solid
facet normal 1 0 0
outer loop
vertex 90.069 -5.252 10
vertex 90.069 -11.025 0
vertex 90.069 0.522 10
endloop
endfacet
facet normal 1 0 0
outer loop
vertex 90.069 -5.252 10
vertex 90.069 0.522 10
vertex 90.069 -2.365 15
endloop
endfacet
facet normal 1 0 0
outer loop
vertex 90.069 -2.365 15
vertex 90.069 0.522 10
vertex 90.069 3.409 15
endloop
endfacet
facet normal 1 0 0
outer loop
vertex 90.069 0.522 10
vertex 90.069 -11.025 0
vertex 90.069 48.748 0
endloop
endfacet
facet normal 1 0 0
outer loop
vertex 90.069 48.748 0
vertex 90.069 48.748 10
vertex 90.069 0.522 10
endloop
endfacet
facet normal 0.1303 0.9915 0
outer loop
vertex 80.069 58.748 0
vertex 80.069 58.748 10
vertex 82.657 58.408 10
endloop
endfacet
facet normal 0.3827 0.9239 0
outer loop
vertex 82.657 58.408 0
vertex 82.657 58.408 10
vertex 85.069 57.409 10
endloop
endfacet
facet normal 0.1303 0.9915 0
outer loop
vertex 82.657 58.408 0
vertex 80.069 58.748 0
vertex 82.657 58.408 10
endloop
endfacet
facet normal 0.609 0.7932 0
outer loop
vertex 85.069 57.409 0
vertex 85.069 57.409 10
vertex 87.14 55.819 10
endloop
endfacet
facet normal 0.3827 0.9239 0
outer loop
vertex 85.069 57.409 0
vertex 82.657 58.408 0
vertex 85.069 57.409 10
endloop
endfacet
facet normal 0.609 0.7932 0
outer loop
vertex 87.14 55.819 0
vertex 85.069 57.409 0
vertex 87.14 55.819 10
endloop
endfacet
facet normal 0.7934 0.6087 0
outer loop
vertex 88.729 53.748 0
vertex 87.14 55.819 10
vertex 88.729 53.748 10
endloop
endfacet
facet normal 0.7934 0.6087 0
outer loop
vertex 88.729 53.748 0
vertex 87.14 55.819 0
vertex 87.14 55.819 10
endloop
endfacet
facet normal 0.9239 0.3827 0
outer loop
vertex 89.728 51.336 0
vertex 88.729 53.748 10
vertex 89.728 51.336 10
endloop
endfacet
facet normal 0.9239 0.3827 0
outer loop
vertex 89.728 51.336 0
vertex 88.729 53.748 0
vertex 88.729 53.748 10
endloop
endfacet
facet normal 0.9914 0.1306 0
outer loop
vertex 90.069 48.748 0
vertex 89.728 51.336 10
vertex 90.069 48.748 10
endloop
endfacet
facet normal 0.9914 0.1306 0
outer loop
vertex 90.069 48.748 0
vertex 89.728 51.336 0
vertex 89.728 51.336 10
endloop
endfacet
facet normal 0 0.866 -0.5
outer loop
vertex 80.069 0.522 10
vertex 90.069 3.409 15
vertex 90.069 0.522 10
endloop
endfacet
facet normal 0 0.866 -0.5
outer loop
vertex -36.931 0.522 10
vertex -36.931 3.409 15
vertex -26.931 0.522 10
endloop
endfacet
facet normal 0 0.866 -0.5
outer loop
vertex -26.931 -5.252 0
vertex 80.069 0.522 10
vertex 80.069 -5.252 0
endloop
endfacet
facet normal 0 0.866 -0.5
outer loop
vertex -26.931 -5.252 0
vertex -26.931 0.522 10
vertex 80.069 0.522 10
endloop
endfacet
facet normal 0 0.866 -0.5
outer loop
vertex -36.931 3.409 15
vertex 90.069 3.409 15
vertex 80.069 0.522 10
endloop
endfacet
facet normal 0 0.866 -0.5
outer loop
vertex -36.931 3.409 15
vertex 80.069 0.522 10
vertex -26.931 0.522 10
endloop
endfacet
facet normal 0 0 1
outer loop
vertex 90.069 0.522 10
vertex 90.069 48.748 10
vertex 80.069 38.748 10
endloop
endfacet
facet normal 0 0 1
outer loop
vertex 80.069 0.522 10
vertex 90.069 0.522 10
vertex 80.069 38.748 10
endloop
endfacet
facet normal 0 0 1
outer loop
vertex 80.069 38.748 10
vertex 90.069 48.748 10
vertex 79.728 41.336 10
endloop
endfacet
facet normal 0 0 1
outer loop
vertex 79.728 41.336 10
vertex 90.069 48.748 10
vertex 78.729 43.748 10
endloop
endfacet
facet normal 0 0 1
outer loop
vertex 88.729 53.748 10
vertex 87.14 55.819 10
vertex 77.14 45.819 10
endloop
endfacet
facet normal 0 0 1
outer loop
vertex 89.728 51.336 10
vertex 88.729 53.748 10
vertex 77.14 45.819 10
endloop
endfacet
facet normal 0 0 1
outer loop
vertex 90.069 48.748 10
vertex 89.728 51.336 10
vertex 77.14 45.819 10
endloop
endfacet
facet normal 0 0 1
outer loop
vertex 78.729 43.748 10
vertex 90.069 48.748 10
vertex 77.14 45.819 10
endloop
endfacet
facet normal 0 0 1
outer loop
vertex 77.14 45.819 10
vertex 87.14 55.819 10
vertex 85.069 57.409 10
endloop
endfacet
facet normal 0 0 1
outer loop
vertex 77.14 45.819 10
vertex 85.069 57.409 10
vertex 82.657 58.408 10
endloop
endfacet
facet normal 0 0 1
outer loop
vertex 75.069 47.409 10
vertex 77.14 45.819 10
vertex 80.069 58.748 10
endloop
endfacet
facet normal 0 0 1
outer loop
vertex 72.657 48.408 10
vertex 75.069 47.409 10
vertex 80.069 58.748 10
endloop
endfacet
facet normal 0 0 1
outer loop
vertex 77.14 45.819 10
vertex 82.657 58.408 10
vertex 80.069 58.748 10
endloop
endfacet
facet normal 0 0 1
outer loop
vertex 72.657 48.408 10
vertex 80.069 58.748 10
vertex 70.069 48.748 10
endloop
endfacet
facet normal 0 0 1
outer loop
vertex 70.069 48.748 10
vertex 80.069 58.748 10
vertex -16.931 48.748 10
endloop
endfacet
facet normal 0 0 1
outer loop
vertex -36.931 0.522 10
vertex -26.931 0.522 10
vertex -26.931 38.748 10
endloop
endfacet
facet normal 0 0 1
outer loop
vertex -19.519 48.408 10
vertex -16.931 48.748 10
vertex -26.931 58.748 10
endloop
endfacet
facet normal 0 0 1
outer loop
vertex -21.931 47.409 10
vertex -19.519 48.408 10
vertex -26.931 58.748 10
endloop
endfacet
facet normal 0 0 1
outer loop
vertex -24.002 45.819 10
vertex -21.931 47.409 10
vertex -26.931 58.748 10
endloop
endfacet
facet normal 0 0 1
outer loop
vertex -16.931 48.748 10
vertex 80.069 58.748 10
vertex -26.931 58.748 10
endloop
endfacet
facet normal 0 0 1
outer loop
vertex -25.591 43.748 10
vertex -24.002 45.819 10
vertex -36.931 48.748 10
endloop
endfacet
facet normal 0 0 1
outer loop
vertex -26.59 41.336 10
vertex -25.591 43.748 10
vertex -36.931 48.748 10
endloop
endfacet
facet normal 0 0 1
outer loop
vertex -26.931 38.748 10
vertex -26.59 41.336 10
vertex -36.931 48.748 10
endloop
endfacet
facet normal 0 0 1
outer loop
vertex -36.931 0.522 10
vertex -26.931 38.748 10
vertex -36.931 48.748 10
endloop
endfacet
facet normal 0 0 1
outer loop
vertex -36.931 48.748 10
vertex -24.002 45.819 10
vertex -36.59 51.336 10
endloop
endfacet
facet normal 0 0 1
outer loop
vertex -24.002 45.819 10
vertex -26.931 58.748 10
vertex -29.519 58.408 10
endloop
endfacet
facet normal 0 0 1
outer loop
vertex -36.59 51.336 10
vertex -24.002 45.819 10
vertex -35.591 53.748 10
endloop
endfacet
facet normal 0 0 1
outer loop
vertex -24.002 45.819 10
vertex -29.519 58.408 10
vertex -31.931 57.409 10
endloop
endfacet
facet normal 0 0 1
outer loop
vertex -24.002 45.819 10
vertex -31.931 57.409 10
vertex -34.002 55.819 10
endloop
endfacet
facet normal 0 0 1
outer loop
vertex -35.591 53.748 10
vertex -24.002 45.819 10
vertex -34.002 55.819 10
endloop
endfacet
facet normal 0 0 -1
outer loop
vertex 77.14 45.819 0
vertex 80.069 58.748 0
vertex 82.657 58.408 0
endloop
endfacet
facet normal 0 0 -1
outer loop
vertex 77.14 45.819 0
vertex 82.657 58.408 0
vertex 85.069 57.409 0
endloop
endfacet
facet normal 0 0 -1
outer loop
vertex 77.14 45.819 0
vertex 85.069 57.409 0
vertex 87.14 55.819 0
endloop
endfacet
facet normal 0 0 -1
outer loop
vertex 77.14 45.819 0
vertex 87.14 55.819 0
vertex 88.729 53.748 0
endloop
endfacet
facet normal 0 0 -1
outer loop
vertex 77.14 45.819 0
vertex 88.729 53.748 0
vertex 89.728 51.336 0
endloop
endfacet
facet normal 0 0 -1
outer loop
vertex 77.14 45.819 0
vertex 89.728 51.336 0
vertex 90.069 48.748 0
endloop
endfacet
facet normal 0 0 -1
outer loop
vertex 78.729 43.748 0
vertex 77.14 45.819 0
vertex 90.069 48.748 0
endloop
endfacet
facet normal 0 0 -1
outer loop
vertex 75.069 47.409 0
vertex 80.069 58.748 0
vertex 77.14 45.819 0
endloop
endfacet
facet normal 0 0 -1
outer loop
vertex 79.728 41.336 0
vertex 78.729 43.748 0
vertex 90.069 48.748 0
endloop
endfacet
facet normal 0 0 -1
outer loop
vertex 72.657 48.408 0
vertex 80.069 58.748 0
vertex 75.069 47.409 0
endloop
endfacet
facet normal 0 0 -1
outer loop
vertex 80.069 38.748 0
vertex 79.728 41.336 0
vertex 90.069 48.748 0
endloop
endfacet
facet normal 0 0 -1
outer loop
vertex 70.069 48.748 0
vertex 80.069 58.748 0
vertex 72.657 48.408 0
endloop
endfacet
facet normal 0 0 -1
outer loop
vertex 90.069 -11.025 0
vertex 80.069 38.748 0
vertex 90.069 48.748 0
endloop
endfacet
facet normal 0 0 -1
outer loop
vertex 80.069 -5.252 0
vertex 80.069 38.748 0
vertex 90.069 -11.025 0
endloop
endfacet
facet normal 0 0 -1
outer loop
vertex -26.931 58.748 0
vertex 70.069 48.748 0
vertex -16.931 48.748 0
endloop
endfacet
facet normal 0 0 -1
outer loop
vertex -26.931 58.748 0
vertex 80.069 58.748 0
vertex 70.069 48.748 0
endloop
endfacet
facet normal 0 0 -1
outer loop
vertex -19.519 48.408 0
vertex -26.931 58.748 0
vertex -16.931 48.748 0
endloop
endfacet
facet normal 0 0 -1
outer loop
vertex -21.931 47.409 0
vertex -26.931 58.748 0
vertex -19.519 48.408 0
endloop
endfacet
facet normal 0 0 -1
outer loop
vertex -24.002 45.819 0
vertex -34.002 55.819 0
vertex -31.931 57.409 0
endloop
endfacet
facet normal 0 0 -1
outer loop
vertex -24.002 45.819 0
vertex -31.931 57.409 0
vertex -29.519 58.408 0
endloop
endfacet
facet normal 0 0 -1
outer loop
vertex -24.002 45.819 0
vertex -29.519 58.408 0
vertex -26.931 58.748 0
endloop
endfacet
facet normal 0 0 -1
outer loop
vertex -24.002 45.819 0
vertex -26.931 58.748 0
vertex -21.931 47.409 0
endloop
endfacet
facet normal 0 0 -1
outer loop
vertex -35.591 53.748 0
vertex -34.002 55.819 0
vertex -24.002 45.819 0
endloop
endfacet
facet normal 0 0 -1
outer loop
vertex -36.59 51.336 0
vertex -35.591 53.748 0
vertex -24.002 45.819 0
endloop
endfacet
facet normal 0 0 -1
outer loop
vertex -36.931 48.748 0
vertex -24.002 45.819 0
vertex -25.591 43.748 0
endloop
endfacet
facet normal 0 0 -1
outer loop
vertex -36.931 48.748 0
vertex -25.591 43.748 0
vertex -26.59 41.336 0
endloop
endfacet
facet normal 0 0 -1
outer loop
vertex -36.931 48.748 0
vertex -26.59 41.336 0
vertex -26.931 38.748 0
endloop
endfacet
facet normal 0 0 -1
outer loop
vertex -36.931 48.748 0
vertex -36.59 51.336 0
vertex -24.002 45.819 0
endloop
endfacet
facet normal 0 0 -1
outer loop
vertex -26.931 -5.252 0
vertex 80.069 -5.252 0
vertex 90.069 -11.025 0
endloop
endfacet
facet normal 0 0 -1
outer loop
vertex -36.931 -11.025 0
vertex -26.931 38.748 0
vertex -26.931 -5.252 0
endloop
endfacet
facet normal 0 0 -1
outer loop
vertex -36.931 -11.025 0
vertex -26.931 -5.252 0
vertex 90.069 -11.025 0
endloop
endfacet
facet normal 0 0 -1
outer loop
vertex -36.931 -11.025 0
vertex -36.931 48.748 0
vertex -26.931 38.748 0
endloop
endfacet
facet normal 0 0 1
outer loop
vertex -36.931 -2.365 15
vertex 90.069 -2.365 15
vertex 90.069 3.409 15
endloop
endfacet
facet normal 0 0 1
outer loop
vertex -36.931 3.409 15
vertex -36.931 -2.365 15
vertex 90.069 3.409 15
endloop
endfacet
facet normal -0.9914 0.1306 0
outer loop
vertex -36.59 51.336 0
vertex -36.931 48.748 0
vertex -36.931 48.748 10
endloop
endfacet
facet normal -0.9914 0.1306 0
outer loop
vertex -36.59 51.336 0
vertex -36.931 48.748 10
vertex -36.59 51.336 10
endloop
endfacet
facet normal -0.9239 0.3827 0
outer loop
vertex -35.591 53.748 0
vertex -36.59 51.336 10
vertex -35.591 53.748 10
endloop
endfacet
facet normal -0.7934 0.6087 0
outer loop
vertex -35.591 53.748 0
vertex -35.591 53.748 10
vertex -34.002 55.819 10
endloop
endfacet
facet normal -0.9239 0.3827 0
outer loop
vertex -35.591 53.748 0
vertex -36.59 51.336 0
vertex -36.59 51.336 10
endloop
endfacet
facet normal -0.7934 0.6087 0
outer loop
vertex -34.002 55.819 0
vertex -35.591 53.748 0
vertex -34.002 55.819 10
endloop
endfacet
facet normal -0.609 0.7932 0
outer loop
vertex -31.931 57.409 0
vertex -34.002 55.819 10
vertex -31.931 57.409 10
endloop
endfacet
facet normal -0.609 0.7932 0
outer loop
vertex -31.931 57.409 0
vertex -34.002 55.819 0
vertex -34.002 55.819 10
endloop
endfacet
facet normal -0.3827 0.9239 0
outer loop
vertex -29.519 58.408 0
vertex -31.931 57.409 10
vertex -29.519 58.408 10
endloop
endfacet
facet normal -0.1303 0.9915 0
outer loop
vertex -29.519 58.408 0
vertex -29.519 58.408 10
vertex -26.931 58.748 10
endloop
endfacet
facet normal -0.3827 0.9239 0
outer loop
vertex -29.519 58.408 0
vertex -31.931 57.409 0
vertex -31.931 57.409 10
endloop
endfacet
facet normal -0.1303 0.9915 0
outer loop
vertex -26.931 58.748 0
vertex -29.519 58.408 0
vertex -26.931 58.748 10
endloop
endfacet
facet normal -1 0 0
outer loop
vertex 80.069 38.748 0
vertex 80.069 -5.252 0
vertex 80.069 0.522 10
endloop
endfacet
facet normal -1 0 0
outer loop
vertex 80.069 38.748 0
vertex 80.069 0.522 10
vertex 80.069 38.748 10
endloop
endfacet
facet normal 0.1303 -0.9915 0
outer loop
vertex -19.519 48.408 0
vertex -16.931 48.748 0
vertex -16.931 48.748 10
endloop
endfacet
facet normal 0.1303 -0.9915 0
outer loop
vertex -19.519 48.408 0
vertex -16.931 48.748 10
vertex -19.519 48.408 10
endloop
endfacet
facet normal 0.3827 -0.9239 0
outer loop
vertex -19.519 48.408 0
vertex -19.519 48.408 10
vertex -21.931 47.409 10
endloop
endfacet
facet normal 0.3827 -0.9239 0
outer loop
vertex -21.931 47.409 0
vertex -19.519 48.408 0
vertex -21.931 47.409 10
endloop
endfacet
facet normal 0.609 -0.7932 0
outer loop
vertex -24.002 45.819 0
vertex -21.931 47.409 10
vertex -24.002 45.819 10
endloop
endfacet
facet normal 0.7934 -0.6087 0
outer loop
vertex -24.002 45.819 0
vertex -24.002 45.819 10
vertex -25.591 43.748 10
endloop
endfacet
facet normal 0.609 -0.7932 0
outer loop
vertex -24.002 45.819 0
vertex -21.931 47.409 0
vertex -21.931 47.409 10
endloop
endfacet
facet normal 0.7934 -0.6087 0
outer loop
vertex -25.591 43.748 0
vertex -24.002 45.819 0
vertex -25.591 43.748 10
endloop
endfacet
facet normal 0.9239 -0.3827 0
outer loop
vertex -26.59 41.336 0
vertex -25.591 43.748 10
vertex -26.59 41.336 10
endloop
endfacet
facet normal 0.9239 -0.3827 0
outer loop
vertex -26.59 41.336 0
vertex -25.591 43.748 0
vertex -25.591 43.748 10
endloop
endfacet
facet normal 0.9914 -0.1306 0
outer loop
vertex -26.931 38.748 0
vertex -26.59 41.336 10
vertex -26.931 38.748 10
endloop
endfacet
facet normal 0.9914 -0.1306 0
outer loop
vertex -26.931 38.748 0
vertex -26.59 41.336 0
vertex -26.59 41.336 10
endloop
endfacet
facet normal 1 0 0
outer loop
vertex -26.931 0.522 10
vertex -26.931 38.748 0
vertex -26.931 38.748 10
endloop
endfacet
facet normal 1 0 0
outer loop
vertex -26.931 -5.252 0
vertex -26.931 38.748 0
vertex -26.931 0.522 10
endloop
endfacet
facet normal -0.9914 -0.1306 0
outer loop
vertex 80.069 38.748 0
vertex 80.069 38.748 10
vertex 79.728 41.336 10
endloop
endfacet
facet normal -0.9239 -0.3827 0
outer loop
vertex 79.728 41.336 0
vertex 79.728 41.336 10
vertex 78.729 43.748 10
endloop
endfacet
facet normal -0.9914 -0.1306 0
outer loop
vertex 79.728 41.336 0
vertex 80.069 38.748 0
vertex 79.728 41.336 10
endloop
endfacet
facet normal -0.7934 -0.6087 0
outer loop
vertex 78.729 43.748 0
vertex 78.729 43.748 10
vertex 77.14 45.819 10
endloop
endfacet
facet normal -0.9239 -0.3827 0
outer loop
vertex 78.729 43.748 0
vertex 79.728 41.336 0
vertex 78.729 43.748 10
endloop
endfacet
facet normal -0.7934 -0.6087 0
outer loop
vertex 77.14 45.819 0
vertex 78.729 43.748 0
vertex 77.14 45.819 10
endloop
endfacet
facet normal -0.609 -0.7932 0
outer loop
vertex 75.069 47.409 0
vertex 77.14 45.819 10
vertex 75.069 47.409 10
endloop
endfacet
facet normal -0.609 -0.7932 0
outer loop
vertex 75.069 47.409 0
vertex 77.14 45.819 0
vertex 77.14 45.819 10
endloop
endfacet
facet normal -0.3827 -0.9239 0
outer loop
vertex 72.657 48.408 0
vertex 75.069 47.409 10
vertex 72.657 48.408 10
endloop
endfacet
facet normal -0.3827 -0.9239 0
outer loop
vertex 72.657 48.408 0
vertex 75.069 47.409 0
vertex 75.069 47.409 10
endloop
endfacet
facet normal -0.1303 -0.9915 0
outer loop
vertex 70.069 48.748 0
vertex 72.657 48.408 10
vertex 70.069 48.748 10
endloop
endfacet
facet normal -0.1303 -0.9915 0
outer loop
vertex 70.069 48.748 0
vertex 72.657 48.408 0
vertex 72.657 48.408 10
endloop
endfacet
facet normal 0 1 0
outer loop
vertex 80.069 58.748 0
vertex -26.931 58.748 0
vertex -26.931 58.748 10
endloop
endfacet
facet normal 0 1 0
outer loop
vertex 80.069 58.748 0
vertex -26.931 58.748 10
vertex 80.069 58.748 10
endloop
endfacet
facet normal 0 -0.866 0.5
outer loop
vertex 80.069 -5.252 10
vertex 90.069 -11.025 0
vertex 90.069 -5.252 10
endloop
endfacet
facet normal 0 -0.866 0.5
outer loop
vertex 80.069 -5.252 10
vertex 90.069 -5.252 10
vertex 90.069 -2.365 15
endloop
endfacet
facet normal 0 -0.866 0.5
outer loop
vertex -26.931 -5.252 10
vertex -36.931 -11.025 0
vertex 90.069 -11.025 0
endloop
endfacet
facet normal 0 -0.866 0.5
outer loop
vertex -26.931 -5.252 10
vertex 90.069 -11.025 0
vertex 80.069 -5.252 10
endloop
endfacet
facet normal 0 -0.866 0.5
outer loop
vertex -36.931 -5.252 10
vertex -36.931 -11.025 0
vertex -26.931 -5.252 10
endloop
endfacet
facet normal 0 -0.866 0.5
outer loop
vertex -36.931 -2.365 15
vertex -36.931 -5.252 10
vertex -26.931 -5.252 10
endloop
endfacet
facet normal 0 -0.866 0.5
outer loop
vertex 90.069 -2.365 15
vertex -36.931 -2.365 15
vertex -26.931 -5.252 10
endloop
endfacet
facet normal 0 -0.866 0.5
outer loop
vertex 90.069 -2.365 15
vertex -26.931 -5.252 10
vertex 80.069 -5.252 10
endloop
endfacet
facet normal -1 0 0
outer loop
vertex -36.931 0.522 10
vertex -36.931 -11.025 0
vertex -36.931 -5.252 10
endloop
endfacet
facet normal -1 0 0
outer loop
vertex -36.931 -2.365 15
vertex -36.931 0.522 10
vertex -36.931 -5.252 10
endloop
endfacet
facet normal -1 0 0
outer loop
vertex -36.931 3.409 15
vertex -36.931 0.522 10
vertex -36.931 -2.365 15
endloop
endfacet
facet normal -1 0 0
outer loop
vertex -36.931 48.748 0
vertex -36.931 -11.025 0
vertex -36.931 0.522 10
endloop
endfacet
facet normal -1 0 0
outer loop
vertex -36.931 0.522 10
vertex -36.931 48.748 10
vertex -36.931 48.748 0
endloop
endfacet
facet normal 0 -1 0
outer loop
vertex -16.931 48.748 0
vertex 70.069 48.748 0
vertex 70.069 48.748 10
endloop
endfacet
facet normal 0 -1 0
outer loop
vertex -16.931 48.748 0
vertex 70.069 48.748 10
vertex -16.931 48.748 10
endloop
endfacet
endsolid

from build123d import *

# Parameters (mm, degrees)
SALIENTE_EXTRUIR1_DEPTH = 10
SALIENTE_EXTRUIR2_DEPTH = 127


with BuildPart() as part:
    # Croquis1 → Saliente-Extruir1 (new body)
    with BuildSketch(Plane.XY):
        with BuildLine():
            Line((-36.931162, -5.25170068), (-36.931162, 48.74829932))
            ThreePointArc((-36.931162, 48.74829932), (-34.002229812, 55.819367132), (-26.931162, 58.74829932))
            Line((-26.931162, 58.74829932), (80.068838, 58.74829932))
            ThreePointArc((80.068838, 58.74829932), (87.139905812, 55.819367132), (90.068838, 48.74829932))
            Line((90.068838, 48.74829932), (90.068838, -5.25170068))
            Line((90.068838, -5.25170068), (80.068838, -5.25170068))
            Line((80.068838, -5.25170068), (80.068838, 38.74829932))
            ThreePointArc((80.068838, 38.74829932), (77.139905812, 45.819367132), (70.068838, 48.74829932))
            Line((70.068838, 48.74829932), (-16.931162, 48.74829932))
            ThreePointArc((-16.931162, 48.74829932), (-24.002229812, 45.819367132), (-26.931162, 38.74829932))
            Line((-26.931162, 38.74829932), (-26.931162, -5.25170068))
            Line((-26.931162, -5.25170068), (-36.931162, -5.25170068))
        make_face()
    extrude(amount=SALIENTE_EXTRUIR1_DEPTH)

    # Croquis2 → Saliente-Extruir2 (add)
    with BuildSketch(Plane.ZY.offset(36.931162)):
        Polygon((0, -11.025203372), (15, -2.364949334), (15, 3.408553358), (0, -5.25170068), align=None)
    extrude(amount=-SALIENTE_EXTRUIR2_DEPTH)


solid = part.part
